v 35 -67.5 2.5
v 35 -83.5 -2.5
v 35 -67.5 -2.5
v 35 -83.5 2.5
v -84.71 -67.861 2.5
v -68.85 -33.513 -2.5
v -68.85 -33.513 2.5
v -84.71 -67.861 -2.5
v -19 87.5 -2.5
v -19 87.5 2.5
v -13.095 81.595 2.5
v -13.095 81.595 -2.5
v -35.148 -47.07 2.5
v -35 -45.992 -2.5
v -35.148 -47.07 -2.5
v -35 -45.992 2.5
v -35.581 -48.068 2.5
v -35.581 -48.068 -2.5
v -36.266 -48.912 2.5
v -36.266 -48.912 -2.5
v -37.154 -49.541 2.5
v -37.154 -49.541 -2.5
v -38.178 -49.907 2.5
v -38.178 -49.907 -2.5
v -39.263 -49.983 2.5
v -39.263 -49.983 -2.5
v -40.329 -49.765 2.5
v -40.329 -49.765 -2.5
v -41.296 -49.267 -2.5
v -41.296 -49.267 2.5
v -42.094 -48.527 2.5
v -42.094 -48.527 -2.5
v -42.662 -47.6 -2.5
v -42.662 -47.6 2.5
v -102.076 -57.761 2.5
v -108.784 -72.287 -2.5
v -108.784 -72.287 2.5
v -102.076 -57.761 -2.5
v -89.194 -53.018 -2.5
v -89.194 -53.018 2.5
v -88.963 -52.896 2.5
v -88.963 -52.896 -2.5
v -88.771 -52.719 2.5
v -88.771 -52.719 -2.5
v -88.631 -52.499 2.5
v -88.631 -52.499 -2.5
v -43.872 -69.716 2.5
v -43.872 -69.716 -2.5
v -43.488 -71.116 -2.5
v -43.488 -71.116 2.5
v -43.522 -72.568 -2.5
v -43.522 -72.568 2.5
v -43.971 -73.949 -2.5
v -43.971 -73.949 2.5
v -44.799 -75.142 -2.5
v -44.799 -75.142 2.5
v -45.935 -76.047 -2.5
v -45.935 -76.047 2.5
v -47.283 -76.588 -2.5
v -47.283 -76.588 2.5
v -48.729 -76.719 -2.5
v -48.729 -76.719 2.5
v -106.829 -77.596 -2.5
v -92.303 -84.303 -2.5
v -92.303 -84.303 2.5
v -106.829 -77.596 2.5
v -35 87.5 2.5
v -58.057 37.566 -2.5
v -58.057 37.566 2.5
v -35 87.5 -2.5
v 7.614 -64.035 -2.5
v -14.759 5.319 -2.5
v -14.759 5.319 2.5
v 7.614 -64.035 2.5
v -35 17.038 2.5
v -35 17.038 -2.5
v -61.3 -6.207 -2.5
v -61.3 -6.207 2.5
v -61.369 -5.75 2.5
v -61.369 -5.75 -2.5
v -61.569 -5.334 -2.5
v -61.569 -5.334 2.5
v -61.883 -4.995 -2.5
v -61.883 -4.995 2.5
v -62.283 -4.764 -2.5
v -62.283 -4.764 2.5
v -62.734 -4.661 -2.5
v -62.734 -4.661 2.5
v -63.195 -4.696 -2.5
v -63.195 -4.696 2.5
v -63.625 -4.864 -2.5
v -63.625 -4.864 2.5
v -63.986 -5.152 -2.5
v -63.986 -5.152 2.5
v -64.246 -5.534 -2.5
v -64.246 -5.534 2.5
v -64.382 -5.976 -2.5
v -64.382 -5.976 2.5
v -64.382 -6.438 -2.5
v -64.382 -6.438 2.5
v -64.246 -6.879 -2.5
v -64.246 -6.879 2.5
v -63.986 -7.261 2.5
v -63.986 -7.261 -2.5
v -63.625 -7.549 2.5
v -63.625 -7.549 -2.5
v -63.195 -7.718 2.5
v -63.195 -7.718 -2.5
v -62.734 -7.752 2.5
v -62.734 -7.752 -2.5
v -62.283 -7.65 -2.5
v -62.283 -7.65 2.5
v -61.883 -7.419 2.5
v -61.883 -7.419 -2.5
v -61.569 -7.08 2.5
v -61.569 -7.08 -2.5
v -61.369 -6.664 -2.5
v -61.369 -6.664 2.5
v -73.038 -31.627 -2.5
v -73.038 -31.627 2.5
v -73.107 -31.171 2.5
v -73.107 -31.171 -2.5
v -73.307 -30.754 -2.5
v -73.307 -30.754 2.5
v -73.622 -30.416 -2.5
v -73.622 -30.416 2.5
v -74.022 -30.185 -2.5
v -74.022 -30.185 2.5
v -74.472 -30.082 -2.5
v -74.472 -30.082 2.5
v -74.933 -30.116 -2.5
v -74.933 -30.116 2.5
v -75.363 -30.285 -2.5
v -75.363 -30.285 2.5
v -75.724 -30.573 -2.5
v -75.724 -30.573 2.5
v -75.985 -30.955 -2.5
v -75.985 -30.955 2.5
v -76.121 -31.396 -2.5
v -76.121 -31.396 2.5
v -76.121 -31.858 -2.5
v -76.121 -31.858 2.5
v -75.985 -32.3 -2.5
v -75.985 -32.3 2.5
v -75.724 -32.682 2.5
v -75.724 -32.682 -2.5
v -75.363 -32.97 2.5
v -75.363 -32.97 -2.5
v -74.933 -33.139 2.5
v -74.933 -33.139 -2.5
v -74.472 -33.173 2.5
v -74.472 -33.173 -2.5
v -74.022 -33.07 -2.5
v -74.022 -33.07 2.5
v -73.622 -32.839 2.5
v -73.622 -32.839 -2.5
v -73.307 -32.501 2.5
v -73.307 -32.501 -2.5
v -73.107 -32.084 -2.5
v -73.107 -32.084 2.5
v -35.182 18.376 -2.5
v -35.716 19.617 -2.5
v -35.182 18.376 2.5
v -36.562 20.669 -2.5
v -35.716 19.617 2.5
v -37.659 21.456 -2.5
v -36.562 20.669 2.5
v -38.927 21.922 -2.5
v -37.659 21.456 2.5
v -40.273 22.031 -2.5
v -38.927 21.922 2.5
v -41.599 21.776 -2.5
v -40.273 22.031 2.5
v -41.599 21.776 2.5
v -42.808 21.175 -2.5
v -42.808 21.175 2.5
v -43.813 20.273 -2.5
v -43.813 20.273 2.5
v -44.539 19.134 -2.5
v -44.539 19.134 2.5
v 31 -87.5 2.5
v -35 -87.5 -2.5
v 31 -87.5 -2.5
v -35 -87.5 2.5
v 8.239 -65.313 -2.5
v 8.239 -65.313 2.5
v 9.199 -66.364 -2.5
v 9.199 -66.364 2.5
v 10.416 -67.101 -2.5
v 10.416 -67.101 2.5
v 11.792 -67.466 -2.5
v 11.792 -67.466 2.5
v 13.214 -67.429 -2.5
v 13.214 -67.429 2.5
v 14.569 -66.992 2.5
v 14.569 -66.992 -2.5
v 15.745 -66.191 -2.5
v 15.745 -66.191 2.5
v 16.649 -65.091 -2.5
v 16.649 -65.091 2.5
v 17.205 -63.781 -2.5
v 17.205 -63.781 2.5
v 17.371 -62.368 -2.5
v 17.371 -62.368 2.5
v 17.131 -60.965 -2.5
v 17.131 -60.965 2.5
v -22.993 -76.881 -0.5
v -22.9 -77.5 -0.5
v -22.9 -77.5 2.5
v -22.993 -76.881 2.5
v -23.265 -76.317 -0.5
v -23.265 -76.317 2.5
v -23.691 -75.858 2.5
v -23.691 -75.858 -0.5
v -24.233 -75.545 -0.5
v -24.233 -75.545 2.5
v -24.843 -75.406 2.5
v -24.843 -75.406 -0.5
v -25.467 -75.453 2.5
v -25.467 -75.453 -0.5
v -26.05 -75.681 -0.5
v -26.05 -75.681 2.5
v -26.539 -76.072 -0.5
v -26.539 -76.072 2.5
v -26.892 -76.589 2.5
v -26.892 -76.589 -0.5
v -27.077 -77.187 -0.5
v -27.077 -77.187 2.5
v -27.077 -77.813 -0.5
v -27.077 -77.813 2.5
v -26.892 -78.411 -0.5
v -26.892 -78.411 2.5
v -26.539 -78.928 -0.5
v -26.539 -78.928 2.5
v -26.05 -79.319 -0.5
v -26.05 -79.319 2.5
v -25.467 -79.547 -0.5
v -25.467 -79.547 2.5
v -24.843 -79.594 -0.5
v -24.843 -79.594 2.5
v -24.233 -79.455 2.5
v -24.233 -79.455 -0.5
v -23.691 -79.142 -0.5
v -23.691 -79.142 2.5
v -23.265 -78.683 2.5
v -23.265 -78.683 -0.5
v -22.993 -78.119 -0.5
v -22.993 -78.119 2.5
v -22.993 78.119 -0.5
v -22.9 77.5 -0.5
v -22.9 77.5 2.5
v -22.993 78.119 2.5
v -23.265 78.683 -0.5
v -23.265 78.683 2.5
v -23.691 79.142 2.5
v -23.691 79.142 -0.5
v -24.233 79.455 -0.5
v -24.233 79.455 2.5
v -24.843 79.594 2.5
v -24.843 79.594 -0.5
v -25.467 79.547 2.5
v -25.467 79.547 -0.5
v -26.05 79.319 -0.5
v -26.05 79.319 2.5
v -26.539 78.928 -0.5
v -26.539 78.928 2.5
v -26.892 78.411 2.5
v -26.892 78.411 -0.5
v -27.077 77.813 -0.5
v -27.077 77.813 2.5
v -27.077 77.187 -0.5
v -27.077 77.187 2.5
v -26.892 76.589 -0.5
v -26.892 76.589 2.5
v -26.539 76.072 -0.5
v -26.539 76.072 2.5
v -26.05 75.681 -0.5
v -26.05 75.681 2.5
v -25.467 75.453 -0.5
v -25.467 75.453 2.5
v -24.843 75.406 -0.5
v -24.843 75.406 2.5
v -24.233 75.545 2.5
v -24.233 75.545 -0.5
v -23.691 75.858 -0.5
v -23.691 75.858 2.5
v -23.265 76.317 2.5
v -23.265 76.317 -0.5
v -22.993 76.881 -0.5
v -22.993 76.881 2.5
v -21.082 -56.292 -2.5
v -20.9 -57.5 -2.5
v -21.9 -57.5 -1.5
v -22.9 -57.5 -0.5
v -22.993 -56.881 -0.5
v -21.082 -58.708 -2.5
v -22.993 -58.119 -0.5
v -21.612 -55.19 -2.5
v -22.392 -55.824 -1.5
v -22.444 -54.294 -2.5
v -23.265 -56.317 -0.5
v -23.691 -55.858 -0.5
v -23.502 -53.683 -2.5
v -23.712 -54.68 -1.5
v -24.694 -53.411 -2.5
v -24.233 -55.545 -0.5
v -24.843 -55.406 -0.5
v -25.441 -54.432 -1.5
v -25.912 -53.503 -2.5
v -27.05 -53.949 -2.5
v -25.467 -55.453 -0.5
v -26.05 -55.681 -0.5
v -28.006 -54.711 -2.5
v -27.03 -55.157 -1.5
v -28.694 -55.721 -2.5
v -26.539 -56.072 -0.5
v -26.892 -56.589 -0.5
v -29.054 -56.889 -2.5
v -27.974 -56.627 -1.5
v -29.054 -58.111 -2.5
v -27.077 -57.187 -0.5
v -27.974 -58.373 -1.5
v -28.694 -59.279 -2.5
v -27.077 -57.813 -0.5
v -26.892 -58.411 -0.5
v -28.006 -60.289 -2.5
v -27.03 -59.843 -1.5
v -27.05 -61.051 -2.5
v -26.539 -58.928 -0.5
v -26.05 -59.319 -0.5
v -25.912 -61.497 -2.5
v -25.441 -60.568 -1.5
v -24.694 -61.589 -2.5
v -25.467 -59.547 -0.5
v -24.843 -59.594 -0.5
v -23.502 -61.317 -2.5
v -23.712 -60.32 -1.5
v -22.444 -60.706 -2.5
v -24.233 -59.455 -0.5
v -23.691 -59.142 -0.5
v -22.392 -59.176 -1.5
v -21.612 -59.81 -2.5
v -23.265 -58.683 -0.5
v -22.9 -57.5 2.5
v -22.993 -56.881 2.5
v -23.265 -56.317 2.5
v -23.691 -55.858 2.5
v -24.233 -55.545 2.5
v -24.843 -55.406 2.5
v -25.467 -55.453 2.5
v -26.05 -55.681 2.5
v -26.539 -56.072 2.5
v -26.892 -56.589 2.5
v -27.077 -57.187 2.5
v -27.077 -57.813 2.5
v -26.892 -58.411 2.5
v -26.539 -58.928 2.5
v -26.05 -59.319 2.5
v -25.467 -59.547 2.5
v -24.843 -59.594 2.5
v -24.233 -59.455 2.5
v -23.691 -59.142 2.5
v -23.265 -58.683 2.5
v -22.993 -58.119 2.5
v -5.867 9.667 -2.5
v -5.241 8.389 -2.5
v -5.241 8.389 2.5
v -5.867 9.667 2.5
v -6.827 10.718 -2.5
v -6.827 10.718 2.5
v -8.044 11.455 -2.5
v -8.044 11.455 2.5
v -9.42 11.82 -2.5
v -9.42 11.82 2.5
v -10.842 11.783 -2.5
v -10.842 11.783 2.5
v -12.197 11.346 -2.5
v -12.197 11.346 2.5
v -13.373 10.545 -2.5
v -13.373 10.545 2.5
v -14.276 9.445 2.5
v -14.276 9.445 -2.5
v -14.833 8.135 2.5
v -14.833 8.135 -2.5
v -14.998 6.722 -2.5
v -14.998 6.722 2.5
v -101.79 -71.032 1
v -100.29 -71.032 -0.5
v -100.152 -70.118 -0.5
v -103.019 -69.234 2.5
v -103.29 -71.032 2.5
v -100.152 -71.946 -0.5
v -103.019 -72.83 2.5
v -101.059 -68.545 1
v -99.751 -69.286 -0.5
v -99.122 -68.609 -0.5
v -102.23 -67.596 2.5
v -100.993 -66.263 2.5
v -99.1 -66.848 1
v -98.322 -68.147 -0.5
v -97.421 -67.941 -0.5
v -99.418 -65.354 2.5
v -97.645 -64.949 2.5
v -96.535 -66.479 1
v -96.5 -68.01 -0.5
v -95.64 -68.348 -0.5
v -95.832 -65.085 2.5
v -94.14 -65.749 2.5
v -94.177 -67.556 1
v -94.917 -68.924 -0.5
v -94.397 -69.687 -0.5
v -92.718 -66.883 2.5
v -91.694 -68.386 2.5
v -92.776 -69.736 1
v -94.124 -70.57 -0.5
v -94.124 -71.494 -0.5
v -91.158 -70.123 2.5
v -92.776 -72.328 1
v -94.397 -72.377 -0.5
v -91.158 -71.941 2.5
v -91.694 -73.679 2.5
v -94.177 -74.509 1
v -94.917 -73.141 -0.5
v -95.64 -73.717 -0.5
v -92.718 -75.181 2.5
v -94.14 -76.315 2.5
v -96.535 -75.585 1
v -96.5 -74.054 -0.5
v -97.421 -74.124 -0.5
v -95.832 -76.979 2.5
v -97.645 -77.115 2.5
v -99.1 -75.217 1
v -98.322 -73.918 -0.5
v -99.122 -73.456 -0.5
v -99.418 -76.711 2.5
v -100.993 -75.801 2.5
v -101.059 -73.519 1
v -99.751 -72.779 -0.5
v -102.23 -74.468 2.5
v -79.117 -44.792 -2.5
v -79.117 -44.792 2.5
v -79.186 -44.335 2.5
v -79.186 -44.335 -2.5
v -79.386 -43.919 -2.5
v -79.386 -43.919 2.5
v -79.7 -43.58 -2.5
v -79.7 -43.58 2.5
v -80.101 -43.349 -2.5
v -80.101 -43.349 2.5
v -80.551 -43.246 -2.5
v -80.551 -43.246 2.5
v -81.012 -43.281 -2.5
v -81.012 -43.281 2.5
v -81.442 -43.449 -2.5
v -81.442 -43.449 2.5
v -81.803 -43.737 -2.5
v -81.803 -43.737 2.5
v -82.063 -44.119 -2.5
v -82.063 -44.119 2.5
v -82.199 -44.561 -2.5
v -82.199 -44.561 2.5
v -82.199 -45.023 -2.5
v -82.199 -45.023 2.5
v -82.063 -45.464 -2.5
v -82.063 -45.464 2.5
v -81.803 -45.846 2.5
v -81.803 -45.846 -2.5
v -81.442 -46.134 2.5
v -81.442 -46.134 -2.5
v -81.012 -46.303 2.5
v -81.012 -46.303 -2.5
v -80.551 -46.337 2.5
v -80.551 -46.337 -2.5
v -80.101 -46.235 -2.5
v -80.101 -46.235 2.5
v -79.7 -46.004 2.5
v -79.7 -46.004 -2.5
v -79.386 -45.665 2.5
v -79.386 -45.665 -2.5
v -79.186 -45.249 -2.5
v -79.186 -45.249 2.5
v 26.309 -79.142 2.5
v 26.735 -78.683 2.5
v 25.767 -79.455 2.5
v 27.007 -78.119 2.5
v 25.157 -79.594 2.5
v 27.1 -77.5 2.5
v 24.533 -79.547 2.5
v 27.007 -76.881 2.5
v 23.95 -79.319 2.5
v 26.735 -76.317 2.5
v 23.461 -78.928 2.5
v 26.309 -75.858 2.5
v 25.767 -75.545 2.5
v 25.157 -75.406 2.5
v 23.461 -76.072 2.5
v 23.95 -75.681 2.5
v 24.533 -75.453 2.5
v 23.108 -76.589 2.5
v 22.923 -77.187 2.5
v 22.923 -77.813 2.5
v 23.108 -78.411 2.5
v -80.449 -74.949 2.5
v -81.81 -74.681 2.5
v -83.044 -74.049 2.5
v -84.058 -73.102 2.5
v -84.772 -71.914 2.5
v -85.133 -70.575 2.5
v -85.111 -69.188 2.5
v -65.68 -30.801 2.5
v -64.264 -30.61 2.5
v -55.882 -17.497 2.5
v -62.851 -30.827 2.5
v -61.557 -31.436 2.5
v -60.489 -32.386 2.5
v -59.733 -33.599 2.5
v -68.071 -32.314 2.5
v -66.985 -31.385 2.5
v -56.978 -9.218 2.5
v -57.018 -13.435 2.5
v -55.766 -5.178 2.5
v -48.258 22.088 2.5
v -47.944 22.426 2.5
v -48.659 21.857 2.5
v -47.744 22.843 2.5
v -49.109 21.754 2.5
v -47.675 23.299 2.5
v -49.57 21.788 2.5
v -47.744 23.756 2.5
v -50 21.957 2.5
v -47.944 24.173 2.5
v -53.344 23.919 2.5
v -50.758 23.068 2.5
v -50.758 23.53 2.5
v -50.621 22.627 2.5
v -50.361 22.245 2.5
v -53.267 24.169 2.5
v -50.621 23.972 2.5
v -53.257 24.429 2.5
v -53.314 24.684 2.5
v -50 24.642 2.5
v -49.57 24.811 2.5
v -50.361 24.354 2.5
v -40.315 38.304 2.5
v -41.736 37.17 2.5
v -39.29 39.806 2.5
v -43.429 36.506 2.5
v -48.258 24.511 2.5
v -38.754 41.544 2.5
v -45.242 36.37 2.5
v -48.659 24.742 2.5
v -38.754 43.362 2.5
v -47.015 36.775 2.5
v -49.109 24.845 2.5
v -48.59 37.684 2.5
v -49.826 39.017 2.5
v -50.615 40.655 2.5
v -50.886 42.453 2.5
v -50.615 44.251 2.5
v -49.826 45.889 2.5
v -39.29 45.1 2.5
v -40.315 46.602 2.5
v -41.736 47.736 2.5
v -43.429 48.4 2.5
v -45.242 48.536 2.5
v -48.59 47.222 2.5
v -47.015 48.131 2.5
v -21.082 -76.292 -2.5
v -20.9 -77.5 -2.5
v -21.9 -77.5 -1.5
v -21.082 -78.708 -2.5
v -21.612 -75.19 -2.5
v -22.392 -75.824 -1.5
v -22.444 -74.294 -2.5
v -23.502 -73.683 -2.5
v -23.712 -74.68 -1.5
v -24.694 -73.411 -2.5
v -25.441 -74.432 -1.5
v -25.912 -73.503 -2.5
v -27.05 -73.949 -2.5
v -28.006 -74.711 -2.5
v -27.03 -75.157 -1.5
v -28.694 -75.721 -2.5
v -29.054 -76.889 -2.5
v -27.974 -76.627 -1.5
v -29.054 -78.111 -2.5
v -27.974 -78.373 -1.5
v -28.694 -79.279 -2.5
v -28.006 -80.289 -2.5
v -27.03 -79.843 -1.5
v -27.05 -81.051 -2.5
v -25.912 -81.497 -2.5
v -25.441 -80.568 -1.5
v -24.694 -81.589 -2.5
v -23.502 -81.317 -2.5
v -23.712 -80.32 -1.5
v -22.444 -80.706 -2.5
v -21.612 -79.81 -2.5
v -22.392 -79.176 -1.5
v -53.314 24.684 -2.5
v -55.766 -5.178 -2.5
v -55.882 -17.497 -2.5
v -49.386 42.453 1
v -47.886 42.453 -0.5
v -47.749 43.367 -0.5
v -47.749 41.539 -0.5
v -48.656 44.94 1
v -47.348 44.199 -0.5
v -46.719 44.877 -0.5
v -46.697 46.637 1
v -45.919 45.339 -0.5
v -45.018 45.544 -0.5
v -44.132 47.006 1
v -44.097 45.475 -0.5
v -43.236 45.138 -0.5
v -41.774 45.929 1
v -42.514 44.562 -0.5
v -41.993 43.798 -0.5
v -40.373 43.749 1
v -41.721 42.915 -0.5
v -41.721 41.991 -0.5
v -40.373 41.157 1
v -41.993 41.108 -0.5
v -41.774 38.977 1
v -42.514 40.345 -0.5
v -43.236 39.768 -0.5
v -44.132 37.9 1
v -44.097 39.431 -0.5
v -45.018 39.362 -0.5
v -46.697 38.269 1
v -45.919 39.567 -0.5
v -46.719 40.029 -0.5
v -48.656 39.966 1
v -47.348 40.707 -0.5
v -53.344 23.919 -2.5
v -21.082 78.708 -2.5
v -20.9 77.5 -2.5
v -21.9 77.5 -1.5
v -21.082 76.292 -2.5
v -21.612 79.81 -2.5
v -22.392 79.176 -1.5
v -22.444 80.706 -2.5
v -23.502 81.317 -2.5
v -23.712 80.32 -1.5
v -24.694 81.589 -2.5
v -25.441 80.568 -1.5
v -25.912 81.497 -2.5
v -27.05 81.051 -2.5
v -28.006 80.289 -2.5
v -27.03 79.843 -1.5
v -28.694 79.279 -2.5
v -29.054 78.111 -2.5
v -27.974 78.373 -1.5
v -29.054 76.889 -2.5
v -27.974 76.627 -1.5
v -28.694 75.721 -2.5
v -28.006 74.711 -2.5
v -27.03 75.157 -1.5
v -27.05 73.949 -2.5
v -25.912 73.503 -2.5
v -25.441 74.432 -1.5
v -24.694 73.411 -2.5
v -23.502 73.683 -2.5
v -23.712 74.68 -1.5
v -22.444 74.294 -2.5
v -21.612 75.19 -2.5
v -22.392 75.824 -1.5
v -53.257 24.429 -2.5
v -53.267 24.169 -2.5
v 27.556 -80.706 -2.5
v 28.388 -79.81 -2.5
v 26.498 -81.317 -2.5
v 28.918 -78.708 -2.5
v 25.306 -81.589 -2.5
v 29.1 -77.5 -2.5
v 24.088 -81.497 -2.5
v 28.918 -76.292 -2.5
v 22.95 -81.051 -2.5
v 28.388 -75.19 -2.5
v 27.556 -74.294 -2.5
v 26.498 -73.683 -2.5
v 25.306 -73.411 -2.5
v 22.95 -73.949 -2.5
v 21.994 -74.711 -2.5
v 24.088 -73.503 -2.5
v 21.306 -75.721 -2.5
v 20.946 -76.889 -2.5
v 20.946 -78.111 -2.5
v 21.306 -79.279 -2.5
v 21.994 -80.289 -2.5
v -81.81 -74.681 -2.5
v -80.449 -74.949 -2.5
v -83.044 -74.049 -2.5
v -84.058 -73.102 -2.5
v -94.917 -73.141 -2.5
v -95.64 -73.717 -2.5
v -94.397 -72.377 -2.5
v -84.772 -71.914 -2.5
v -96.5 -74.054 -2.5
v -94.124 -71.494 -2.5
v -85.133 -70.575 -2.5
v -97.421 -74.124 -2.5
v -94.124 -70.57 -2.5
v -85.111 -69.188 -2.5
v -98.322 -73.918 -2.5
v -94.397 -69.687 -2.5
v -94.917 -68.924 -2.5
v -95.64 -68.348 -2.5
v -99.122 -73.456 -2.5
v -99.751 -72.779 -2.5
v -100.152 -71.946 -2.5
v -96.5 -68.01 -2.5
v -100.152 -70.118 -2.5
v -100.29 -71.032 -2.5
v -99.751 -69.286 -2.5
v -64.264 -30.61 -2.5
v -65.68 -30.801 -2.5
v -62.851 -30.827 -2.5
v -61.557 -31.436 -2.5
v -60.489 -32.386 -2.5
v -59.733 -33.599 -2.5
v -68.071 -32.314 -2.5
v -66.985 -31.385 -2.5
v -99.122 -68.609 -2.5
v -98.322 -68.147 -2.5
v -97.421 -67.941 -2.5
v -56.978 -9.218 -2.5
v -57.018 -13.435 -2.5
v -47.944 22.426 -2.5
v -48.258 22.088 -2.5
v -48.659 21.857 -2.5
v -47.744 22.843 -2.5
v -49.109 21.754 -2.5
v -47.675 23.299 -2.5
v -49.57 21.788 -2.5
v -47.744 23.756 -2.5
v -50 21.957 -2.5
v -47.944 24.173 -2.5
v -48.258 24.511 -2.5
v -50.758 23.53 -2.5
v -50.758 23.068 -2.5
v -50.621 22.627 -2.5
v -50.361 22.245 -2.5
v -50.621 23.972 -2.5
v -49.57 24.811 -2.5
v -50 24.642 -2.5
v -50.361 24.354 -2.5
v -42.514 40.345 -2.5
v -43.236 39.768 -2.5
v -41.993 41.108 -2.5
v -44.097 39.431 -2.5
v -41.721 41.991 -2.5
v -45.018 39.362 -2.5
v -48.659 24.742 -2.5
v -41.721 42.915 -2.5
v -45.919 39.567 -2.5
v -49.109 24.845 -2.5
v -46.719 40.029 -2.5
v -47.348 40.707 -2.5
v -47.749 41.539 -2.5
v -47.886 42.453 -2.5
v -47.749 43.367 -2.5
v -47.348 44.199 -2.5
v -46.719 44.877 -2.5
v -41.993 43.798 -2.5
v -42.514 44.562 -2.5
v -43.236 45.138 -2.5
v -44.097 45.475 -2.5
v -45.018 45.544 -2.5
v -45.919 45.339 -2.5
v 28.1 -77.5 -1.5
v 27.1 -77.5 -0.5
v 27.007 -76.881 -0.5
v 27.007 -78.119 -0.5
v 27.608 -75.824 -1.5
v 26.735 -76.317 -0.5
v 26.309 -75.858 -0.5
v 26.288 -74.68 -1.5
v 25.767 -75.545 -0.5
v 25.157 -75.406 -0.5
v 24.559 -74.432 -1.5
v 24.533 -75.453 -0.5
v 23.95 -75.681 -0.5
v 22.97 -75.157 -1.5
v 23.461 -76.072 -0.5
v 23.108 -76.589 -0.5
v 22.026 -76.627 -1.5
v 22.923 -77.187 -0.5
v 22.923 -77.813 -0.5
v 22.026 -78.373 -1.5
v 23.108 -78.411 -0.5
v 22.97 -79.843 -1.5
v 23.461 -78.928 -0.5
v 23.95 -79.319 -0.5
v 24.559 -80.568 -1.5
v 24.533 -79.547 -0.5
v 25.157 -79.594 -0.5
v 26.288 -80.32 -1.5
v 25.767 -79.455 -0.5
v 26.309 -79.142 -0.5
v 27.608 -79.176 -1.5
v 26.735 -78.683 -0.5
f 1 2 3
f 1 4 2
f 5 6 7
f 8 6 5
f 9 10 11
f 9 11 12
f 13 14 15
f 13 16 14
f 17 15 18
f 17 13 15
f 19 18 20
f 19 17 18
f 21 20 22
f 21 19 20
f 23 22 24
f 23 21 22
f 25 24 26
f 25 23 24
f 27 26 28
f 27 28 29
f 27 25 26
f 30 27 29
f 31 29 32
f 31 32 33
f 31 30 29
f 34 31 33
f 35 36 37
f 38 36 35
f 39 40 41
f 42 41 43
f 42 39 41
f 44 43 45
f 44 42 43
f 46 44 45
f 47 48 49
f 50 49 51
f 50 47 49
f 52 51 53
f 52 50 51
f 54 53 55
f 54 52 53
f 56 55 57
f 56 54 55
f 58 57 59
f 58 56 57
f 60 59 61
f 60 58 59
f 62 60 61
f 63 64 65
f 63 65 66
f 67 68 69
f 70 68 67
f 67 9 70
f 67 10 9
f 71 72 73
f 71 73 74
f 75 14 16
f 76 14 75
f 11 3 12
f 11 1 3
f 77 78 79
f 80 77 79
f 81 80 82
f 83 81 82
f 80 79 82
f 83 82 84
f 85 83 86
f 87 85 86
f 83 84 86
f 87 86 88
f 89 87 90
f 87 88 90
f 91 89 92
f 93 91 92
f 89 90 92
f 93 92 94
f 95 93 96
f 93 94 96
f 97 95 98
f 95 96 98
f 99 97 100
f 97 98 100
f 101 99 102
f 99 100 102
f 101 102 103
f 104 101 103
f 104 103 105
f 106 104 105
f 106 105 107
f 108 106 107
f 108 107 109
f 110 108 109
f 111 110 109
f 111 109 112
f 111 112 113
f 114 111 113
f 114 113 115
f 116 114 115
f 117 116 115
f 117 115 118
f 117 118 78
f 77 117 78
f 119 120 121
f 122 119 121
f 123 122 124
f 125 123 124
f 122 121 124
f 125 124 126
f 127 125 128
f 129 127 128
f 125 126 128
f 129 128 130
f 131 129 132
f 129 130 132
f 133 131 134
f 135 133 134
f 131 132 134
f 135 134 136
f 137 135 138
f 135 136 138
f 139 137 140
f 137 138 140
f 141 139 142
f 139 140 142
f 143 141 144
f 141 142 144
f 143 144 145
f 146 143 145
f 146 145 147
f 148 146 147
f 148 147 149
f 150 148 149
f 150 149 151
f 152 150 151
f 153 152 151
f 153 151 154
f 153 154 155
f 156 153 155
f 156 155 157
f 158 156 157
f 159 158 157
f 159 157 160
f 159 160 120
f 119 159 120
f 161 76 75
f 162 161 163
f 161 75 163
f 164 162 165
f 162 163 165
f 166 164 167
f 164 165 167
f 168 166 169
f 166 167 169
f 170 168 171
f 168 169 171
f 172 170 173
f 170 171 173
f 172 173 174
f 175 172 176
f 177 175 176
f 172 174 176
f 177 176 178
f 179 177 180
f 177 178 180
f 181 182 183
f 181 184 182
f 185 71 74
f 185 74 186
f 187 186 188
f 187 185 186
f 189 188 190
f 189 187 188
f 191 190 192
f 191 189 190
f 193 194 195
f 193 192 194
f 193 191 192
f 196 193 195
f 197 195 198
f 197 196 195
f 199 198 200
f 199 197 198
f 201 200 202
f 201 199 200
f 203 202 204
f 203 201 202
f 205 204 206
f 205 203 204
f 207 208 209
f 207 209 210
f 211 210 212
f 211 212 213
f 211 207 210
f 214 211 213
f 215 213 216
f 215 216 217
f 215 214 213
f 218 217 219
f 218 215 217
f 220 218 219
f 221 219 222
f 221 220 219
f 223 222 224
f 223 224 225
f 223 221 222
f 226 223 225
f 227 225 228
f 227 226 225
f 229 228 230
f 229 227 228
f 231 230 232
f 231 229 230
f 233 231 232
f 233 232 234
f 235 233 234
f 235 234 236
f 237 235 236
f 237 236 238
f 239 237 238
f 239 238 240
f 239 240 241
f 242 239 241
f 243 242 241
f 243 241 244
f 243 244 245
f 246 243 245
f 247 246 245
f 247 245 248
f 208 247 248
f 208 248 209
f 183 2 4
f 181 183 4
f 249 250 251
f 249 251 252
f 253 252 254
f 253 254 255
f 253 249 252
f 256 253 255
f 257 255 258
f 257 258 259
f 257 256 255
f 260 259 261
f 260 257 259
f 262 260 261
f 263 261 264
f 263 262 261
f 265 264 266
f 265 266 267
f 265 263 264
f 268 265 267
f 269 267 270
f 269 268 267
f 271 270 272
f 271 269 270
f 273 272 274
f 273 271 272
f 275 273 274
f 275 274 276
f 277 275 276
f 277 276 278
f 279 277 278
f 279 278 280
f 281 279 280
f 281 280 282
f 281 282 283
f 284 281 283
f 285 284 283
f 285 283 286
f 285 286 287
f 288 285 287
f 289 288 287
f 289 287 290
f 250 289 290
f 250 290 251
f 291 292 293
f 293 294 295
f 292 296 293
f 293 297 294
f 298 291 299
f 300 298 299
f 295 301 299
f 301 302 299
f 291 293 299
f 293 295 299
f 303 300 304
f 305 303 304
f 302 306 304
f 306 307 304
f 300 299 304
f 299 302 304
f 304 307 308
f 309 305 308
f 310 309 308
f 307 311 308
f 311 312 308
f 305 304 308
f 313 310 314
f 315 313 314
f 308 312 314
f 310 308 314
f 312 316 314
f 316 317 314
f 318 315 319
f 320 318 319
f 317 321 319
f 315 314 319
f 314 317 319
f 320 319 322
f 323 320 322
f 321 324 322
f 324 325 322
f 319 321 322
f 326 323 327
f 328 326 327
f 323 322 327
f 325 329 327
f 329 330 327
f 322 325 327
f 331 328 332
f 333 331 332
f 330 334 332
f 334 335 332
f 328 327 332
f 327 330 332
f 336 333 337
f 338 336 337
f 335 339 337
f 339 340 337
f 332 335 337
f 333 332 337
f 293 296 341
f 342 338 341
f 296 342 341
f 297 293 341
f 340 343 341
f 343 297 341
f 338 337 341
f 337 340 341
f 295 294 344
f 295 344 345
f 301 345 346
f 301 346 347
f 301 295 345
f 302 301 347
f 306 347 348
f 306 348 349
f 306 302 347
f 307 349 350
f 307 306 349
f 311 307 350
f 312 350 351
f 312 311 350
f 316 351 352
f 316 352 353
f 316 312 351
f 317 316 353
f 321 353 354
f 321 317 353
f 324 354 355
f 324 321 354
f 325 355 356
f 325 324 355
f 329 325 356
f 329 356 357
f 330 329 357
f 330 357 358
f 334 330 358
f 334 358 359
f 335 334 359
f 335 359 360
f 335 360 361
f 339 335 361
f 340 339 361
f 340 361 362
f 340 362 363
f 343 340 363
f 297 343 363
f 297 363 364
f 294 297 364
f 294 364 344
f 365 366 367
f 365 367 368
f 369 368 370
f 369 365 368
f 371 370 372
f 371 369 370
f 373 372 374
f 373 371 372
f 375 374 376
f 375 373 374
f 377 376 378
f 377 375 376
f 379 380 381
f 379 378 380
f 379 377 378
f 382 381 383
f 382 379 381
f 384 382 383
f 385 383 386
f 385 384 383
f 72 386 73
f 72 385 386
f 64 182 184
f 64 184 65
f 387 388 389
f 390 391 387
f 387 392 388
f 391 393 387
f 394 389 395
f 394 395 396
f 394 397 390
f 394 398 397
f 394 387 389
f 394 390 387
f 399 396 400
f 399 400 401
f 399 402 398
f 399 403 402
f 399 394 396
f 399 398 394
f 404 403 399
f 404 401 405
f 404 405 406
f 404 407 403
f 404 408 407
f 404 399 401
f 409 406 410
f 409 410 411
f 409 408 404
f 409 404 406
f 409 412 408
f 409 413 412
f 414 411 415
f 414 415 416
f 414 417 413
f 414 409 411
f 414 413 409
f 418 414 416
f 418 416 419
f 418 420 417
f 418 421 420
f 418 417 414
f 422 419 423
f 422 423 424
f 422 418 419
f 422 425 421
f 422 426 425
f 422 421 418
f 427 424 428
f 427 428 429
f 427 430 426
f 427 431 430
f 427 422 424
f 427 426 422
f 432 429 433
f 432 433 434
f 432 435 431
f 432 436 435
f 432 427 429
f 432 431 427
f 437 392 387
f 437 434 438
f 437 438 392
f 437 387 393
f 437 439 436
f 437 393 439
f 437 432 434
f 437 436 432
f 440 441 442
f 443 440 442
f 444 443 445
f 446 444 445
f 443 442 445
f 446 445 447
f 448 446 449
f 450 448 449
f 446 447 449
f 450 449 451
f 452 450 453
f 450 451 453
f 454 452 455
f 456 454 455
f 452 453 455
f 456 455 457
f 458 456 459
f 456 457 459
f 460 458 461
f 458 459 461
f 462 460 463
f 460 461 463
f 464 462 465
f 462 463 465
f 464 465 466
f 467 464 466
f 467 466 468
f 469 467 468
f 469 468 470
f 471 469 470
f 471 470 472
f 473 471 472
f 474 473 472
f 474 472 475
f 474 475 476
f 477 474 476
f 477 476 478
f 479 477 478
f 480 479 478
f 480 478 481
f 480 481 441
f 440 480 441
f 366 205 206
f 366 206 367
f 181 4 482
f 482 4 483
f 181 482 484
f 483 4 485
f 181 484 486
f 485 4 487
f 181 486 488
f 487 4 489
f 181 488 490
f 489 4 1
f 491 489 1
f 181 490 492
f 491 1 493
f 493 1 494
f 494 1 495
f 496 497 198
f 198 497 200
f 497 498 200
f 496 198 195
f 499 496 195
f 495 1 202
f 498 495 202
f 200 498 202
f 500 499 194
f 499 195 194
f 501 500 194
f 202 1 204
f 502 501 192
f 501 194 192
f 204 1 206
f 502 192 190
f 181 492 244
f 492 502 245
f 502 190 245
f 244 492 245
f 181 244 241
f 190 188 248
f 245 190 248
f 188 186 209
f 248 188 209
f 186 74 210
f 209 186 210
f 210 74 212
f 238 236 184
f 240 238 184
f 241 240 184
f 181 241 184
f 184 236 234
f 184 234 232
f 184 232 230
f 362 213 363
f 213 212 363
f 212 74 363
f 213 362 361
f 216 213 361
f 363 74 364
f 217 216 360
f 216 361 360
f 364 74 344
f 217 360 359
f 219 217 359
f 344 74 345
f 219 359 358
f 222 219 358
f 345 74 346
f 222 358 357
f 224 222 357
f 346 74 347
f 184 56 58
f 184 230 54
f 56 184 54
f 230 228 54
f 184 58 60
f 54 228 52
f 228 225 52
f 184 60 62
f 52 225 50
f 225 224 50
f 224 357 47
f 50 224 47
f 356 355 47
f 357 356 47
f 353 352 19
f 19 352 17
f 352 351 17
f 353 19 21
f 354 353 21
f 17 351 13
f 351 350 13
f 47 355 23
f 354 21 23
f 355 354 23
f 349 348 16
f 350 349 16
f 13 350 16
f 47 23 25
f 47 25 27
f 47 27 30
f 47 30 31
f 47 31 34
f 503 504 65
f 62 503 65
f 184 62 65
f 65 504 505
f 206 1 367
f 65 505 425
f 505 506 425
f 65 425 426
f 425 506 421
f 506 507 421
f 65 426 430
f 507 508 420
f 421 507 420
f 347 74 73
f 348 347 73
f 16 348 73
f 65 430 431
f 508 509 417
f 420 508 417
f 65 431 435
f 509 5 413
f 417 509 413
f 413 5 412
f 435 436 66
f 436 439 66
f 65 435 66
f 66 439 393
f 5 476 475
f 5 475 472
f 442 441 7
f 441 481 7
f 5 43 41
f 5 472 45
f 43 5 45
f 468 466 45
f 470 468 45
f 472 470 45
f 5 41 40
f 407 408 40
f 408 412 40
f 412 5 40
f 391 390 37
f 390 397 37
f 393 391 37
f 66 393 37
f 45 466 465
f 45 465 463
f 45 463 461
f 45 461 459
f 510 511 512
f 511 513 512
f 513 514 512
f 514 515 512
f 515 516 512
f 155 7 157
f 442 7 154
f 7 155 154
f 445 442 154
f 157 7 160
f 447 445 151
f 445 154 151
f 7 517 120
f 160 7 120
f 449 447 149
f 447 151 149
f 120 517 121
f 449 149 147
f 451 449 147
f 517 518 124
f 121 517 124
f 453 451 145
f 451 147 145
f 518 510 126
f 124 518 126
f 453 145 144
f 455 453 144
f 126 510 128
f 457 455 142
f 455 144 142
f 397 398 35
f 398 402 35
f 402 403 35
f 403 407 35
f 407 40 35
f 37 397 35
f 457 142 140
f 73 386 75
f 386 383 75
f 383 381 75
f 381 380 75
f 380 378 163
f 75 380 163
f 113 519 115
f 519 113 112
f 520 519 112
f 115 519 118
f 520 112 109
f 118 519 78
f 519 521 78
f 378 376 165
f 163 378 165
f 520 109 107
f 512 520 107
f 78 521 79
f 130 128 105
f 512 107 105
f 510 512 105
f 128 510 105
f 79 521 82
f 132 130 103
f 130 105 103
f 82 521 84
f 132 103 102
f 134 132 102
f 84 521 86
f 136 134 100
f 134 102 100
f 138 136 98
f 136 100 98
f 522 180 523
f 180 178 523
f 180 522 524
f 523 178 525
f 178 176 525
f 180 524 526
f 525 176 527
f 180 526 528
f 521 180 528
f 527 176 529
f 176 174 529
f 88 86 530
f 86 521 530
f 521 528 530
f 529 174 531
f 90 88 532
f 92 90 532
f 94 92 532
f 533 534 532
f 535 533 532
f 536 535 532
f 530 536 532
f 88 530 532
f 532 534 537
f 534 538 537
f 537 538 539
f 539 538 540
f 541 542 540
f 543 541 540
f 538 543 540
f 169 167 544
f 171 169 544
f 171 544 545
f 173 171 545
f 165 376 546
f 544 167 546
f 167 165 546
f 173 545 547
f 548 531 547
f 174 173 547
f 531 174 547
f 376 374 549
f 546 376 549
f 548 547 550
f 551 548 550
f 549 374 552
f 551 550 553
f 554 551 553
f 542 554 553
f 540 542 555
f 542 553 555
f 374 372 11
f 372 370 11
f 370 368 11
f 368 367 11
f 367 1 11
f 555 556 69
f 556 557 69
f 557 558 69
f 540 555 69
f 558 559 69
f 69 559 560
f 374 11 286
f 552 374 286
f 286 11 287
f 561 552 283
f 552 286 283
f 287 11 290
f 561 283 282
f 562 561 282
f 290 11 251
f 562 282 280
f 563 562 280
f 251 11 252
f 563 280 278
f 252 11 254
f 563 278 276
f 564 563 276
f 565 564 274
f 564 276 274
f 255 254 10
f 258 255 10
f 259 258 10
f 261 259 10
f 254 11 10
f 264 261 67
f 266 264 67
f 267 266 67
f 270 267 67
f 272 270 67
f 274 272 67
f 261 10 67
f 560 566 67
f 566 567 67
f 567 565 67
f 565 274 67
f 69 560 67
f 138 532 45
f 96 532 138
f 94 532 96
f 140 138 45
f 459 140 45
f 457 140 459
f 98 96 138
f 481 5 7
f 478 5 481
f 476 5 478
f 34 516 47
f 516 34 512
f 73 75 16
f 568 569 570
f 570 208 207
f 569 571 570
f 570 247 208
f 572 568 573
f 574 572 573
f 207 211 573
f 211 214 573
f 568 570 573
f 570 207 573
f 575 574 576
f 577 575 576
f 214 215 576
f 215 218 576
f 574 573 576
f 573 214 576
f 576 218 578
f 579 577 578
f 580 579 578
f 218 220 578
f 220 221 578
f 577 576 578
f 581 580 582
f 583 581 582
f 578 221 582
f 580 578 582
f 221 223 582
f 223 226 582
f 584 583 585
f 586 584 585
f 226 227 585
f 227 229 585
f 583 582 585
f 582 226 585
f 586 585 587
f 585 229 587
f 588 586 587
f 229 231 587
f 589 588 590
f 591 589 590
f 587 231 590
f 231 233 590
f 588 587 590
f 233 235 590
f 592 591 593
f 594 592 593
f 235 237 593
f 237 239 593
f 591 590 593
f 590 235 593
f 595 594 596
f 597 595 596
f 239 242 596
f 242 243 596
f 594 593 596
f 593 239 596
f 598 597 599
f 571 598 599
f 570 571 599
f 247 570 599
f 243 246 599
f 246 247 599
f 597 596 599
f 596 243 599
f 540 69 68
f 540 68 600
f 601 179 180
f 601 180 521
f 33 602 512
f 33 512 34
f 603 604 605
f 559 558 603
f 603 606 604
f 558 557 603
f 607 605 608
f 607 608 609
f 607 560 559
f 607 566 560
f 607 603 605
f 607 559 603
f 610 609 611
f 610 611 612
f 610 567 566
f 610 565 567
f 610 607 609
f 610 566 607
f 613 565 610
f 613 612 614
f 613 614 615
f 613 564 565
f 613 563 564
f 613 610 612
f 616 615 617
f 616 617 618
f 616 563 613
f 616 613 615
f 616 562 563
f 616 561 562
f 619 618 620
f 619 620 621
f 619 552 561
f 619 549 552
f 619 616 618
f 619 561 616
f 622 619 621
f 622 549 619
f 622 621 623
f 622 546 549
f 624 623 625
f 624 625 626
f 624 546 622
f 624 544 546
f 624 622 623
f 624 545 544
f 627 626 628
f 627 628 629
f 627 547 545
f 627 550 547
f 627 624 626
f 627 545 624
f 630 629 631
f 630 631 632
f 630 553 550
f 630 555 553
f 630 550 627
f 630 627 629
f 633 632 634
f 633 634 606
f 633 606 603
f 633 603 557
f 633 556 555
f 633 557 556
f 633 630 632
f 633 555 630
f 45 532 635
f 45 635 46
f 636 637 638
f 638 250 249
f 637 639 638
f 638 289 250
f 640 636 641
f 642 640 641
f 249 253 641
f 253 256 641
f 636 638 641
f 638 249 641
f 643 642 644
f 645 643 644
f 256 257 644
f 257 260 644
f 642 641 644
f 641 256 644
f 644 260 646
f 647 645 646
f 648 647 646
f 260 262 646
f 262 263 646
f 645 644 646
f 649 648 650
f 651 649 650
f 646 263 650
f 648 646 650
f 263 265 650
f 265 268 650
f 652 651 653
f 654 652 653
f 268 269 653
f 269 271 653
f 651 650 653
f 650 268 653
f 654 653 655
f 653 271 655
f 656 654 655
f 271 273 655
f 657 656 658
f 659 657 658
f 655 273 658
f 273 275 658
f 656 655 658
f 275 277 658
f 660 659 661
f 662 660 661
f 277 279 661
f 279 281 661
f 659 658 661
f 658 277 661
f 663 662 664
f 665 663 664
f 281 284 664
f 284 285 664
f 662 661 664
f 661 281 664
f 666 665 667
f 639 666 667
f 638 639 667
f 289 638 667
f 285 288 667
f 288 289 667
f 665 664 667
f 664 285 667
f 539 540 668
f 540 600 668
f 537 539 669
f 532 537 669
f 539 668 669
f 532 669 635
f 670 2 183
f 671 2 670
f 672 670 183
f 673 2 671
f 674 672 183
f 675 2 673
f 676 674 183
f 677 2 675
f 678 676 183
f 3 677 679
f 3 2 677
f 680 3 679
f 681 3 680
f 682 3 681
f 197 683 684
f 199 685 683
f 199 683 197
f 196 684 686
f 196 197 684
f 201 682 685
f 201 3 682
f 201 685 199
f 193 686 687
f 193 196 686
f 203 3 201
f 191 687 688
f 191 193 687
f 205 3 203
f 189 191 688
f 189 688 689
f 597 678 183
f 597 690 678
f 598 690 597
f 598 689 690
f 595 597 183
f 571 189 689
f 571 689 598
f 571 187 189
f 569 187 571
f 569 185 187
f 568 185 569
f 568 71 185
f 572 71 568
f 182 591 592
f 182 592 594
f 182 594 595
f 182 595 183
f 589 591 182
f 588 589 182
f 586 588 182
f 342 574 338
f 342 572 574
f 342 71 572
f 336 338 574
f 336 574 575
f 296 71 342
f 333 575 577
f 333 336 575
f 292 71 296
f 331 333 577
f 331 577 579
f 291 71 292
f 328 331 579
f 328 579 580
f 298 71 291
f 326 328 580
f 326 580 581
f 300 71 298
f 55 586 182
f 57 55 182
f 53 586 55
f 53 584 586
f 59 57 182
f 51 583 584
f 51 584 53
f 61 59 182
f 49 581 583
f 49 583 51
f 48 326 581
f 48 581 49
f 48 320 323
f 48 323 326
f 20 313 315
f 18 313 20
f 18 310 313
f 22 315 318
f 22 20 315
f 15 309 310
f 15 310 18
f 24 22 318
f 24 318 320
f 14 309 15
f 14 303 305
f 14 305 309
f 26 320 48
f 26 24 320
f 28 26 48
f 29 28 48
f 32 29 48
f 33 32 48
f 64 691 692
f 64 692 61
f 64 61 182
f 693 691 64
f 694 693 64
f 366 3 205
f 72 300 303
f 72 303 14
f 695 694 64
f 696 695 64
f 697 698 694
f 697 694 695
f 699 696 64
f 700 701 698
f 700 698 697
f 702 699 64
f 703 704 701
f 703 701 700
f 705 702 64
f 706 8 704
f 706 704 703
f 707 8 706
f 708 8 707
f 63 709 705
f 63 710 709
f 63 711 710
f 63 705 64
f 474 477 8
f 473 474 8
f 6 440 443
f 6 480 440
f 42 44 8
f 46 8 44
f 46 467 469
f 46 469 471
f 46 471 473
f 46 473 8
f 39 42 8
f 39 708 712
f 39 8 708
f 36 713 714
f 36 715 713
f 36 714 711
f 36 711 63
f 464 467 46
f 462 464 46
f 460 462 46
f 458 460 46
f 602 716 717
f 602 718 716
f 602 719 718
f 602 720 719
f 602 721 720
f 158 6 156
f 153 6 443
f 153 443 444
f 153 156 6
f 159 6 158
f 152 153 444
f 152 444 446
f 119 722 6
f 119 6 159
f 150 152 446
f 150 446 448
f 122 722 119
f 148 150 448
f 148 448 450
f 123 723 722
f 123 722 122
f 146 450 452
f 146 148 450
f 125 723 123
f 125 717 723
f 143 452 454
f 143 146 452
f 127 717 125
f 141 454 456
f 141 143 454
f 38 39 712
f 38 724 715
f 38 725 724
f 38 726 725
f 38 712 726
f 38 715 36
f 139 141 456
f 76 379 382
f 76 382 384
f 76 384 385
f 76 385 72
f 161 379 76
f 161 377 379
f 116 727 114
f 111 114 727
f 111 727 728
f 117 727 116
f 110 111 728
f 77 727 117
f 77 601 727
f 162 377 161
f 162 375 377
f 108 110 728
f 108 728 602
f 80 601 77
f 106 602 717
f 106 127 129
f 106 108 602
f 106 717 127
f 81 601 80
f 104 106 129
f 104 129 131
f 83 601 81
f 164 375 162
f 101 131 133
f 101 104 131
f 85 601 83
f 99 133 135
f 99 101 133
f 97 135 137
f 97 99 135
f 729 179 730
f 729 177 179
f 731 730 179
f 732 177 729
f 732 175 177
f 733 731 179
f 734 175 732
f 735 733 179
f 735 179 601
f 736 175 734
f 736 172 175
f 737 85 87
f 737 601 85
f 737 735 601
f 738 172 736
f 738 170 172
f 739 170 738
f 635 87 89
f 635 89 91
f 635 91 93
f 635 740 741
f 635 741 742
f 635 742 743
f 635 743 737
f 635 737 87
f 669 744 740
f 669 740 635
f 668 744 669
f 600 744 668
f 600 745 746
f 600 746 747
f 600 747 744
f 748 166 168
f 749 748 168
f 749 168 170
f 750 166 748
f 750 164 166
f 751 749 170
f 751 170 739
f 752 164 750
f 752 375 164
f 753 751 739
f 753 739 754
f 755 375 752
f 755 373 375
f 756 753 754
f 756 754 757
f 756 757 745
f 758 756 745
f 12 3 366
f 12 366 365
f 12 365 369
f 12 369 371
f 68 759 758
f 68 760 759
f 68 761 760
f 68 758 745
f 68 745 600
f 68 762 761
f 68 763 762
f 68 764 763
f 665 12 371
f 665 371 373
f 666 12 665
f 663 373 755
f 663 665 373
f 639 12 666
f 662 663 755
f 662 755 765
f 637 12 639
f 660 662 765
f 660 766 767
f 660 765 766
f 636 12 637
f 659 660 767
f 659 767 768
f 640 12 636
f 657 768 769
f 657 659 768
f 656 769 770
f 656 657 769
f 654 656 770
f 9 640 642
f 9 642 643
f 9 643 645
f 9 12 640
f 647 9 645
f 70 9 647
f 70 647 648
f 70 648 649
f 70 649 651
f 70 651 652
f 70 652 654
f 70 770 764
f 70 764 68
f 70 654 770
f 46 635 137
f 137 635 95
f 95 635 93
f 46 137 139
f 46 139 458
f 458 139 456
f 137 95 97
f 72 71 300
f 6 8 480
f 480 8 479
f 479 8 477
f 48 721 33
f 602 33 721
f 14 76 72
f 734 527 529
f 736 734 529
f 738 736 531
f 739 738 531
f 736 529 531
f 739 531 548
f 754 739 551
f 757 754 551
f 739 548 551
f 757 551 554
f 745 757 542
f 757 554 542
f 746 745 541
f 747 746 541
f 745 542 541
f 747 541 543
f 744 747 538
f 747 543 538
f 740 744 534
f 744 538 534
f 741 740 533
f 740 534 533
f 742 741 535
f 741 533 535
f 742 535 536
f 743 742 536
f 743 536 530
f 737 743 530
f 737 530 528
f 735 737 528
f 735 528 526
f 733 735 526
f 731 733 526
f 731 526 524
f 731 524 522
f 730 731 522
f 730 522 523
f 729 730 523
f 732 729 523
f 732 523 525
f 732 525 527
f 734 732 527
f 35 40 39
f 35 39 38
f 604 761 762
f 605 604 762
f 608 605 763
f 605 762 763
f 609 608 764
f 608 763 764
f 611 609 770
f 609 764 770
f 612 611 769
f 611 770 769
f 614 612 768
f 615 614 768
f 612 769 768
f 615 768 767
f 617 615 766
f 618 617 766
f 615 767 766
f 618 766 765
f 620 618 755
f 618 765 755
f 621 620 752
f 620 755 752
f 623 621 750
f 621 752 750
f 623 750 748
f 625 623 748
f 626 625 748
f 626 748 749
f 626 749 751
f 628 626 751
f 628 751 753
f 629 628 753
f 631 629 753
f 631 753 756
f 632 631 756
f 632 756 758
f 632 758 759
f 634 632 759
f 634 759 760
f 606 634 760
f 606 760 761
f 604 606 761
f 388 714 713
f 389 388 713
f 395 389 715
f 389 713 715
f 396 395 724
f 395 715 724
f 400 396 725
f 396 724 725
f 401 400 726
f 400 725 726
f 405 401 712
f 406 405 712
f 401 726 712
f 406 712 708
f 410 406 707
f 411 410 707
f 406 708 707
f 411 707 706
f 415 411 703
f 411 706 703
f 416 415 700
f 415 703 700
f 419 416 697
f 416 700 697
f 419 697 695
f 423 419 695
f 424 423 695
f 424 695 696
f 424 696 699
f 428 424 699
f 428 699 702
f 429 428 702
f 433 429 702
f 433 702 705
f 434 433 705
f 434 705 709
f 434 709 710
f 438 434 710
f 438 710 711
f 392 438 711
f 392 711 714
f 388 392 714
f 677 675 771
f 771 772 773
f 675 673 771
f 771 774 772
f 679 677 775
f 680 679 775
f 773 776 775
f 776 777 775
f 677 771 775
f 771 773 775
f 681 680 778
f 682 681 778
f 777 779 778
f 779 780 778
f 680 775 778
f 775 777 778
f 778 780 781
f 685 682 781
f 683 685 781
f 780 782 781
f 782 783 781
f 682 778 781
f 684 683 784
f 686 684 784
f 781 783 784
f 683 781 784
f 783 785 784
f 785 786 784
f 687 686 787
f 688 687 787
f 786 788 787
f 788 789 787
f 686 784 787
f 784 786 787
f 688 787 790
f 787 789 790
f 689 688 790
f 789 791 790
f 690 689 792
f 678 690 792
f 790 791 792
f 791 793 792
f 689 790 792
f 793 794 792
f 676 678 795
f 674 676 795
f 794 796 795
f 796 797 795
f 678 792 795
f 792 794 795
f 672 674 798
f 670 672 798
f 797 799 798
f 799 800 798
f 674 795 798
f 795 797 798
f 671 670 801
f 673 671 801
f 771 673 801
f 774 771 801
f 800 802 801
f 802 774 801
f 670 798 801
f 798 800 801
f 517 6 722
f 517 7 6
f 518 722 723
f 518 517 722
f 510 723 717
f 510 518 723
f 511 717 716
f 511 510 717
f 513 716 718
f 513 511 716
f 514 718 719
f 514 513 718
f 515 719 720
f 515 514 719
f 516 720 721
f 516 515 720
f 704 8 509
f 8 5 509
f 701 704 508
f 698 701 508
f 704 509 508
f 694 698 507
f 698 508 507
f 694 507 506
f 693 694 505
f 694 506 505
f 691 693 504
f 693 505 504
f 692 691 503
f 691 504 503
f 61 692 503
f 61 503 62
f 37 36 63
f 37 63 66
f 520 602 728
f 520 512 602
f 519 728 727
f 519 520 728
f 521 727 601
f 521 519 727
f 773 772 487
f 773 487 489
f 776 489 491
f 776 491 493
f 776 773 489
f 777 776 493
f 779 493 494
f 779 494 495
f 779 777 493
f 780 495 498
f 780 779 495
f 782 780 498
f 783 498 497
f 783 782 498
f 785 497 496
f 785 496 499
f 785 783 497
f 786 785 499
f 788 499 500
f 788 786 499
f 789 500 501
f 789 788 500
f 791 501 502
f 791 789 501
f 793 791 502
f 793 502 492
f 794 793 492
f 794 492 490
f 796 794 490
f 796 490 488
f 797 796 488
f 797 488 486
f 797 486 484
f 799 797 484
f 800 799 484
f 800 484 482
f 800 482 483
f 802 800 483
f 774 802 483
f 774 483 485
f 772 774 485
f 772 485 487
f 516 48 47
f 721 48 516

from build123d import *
from OCP.BRepFilletAPI import BRepFilletAPI_MakeChamfer

# Parameters (mm, degrees)
SKETCH_1_R          = 2.1
EXTRUDE_1_DEPTH     = 2.5
CUT_EXTRUDE_1_DEPTH = 95.372930441
EXTRUDE_2_DEPTH     = 5
CUT_EXTRUDE_2_DEPTH = 142.00635371
FILLET_1_R          = 5
FILLET_2_R          = 4
FILLET_3_R          = 15
CHAMFER_1_SIZE      = 4
CHAMFER_1_SIZE2     = 6.20437999
CHAMFER_2_SIZE      = 2
SKETCH_6_R          = 3.1
CUT_EXTRUDE_3_DEPTH = 140.696602049
CUT_EXTRUDE_4_DEPTH = 140.696602049
SKETCH_8_R          = 1.55
CUT_EXTRUDE_5_DEPTH = 140.696602049
FILLET_4_R          = 1
CHAMFER_3_SIZE      = 3


with BuildPart() as part:
    # 草图1 → 凸台-拉伸1 (new, symmetric)
    with BuildSketch(Plane.XY):
        Polygon((-35, 87.5), (-35, -87.5), (35, -87.5), (35, -67.5), (-15, 87.5), align=None)
        with Locations((-25, -77.5)):
            Circle(SKETCH_1_R, mode=Mode.SUBTRACT)
        with Locations((25, -77.5)):
            Circle(SKETCH_1_R, mode=Mode.SUBTRACT)
        with Locations((-25, 77.5)):
            Circle(SKETCH_1_R, mode=Mode.SUBTRACT)
        with Locations((-25, -57.5)):
            Circle(SKETCH_1_R, mode=Mode.SUBTRACT)
    extrude(amount=EXTRUDE_1_DEPTH, both=True)

    # 草图2 → 切除-拉伸1 (cut, through all)
    with BuildSketch(Plane(origin=(0, 0, -2.5), x_dir=(-1, 0, 0), z_dir=(0, 0, -1))):
        with BuildLine():
            Line((-17.130804412, -60.9649861), (5.241456911, 8.389024))
            ThreePointArc((5.241456911, 8.389024), (11.5350139, 11.612553189), (14.758543089, 5.318996201))
            Line((14.758543089, 5.318996201), (-7.613718234, -64.0350139))
            ThreePointArc((-7.613718234, -64.0350139), (-13.907275222, -67.258543089), (-17.130804412, -60.9649861))
        make_face()
    extrude(amount=-CUT_EXTRUDE_1_DEPTH, mode=Mode.SUBTRACT)

    # 草图3 → 凸台-拉伸2 (add)
    with BuildSketch(Plane(origin=(0, 0, -2.5), x_dir=(-1, 0, 0), z_dir=(0, 0, -1))):
        Polygon((35, -87.5), (92.302946454, -84.303295451), (110.460589291, -75.918785529), (35, 87.5), align=None)
    extrude(amount=-EXTRUDE_2_DEPTH)

    # 草图5 → 切除-拉伸2 (cut, through all)
    with BuildSketch(Plane(origin=(0, 0, -2.5), x_dir=(-1, 0, 0), z_dir=(0, 0, -1))):
        Polygon((35, 39.792977913), (58.598142626, -11.311576727), (35, -65.049025296), align=None)
        Polygon((87.794289034, -74.539267276), (40.598003783, -77.172161204), (64.196146409, -23.434712635), align=None)
    extrude(amount=-CUT_EXTRUDE_2_DEPTH, mode=Mode.SUBTRACT)

    # 圆角1
    fillet_1_edges = [part.edges().sort_by_distance(p)[0] for p in [
        (-64.196146409, -23.434712635, 0),
        (-87.794289034, -74.539267276, 0),
        (-40.598003783, -77.172161204, 0),
        (-35, 39.792977913, 0),
    ]]
    fillet(fillet_1_edges, radius=FILLET_1_R)

    # 圆角2
    fillet_2_edges = [part.edges().sort_by_distance(p)[0] for p in [
        (-35, -65.049025296, 0),
    ]]
    fillet(fillet_2_edges, radius=FILLET_2_R)

    # 圆角3
    fillet_3_edges = [part.edges().sort_by_distance(p)[0] for p in [
        (-58.598142626, -11.311576727, 0),
    ]]
    fillet(fillet_3_edges, radius=FILLET_3_R)

    # 倒角1: one chamfer whose edges measure the first distance from different faces: ONE call of the kernel's chamfer builder (chamfer() names one face for all edges)
    chamfer_1_edges_1 = [part.edges().sort_by_distance(p)[0] for p in [
        (-110.460589291, -75.918785529, 0),
        (35, -87.5, 0),
    ]]
    chamfer_1_edges_2 = [part.edges().sort_by_distance(p)[0] for p in [
        (-15, 87.5, 0),
    ]]
    chamfer_1_side_2 = [part.faces().sort_by_distance(p)[0] for p in [
        (-25, 87.5, 0),
    ]]
    chamfer_1 = BRepFilletAPI_MakeChamfer(part.part.solid().wrapped)
    for e in chamfer_1_edges_1:
        chamfer_1.Add(CHAMFER_1_SIZE, e.wrapped)
    for e in chamfer_1_edges_2:
        chamfer_1.Add(CHAMFER_1_SIZE, CHAMFER_1_SIZE2, e.wrapped, chamfer_1_side_2[0].wrapped)  # the first distance lies on this face
    add(Compound.cast(chamfer_1.Shape()), mode=Mode.REPLACE)

    # 倒角2
    chamfer_2_edges = [part.edges().sort_by_distance(p)[0] for p in [
        (22.9, -77.5, -2.5),
        (-27.1, -77.5, -2.5),
        (-27.1, 77.5, -2.5),
        (-27.1, -57.5, -2.5),
    ]]
    chamfer(chamfer_2_edges, length=CHAMFER_2_SIZE)

    # 草图6 → 切除-拉伸3 (cut, through all)
    with BuildSketch(Plane(origin=(0, 0, -2.5), x_dir=(-1, 0, 0), z_dir=(0, 0, -1))):
        with Locations((97.189512912, -71.032219072)):
            Circle(SKETCH_6_R)
        with Locations((44.786325904, 42.453048657)):
            Circle(SKETCH_6_R)
    extrude(amount=-CUT_EXTRUDE_3_DEPTH, mode=Mode.SUBTRACT)

    # 草图7 → 切除-拉伸4 (cut, through all)
    with BuildSketch(Plane.XY.offset(2.5)):
        Polygon((-58.057402283, 37.566482199), (-53.170835826, 24.29540582), (-88.805002991, -52.874576235), (-102.07607937, -57.761142693), align=None)
    extrude(amount=-CUT_EXTRUDE_4_DEPTH, mode=Mode.SUBTRACT)

    # 草图8 → 切除-拉伸5 (cut, through all)
    with BuildSketch(Plane.XY.offset(2.5)):
        with Locations((-49.224888136, 23.299415443)):
            Circle(SKETCH_8_R)
        with Locations((-62.849716758, -6.206754167)):
            Circle(SKETCH_8_R)
        with Locations((-74.588030648, -31.627454138)):
            Circle(SKETCH_8_R)
        with Locations((-80.666800341, -44.791745195)):
            Circle(SKETCH_8_R)
    extrude(amount=-CUT_EXTRUDE_5_DEPTH, mode=Mode.SUBTRACT)

    # 圆角4
    fillet_4_edges = [part.edges().sort_by_distance(p)[0] for p in [
        (-53.170835826, 24.29540582, 0),
        (-88.805002991, -52.874576235, 0),
    ]]
    fillet(fillet_4_edges, radius=FILLET_4_R)

    # 倒角3
    chamfer_3_edges = [part.edges().sort_by_distance(p)[0] for p in [
        (-94.089512912, -71.032219072, 2.5),
        (-41.686325904, 42.453048657, 2.5),
    ]]
    chamfer(chamfer_3_edges, length=CHAMFER_3_SIZE)


solid = part.part
